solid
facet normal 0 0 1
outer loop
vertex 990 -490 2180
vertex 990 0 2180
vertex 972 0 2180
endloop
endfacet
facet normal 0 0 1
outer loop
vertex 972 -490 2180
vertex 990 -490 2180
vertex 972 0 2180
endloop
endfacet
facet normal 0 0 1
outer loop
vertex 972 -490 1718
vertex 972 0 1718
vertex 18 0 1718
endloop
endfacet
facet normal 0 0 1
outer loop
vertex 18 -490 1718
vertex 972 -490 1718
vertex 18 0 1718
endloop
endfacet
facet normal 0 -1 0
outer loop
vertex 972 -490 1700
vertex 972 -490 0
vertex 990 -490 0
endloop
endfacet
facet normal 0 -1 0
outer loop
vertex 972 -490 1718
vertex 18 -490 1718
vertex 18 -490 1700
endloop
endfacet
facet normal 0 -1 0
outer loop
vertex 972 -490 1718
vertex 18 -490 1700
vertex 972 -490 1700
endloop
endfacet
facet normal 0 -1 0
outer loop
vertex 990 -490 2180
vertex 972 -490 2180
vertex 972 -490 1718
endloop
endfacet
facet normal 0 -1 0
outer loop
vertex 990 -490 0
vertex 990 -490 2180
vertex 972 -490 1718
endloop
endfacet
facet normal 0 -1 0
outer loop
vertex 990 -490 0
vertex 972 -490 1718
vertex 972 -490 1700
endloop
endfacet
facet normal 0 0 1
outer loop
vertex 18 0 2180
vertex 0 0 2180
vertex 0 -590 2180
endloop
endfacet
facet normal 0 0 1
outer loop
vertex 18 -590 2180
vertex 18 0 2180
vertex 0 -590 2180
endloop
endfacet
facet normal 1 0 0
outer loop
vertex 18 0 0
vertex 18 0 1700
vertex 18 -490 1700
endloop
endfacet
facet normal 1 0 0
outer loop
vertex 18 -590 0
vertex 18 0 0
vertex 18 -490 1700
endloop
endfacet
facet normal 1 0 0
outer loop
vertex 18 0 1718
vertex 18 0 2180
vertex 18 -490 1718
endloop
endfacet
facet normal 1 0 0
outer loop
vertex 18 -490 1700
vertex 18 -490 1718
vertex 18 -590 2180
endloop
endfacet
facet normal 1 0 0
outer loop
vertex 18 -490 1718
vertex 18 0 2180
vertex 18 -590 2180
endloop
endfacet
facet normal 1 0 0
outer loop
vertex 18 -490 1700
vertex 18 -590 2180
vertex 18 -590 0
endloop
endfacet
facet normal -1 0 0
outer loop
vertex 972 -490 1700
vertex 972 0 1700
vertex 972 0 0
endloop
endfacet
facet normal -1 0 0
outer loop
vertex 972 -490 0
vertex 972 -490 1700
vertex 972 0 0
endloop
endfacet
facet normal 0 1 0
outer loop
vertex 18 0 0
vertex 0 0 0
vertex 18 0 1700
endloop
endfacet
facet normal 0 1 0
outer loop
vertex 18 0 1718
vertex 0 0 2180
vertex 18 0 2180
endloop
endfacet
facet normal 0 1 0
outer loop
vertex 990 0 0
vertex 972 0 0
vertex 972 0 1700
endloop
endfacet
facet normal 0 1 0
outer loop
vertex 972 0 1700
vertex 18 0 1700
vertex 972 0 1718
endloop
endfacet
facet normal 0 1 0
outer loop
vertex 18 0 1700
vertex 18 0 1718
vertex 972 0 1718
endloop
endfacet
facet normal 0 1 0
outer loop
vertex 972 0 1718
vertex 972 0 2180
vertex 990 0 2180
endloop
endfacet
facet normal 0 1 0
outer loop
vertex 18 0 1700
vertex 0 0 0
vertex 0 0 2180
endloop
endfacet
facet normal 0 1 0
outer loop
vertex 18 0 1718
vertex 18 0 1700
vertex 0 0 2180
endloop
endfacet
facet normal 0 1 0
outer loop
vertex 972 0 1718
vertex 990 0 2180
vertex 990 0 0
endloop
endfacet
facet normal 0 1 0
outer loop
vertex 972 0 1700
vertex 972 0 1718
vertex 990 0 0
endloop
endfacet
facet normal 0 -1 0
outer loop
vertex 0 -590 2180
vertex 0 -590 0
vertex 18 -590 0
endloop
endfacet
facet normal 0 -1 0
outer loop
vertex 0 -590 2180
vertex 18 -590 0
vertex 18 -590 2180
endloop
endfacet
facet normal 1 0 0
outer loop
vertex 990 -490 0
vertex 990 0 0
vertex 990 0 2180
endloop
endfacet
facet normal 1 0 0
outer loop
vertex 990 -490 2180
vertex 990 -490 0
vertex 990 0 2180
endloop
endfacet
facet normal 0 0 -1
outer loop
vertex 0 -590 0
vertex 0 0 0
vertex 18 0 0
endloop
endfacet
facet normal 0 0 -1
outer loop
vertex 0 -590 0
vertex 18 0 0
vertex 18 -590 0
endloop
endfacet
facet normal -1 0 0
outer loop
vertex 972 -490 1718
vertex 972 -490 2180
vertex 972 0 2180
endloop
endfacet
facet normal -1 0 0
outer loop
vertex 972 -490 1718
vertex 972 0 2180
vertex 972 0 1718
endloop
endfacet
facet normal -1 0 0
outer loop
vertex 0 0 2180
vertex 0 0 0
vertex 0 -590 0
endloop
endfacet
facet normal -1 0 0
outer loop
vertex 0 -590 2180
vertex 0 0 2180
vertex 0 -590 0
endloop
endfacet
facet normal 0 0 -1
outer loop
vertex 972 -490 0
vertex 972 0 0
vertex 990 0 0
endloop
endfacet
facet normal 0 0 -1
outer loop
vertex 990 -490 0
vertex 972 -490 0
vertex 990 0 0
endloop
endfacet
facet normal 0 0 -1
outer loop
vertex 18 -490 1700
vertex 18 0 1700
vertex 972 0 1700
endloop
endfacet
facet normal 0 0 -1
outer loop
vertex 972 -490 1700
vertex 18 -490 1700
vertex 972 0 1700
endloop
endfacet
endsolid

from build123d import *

# Parameters (mm, degrees)
F1_DEPTH = 490
F2_W     = 100
F2_H     = 2180
F3_DEPTH = 18


with BuildPart() as f1:
    # F0 (on Front) → F1 (new body)
    with BuildSketch(Plane.XZ):
        Polygon((0, 2180), (0, 0), (18, 0), (18, 1700), (972, 1700), (972, 0), (990, 0), (990, 2180), (972, 2180), (972, 2162), (972, 1718), (18, 1718), (18, 2162), (18, 2180), align=None)
    extrude(amount=F1_DEPTH)

    # F2 (on face) → F3 (join)
    with BuildSketch(Plane(origin=(0, 0, 0), x_dir=(0, -1, 0), z_dir=(-1, 0, 0))):
        with Locations((540, 1090)):
            Rectangle(F2_W, F2_H)
    extrude(amount=-F3_DEPTH)


solid = f1.part
